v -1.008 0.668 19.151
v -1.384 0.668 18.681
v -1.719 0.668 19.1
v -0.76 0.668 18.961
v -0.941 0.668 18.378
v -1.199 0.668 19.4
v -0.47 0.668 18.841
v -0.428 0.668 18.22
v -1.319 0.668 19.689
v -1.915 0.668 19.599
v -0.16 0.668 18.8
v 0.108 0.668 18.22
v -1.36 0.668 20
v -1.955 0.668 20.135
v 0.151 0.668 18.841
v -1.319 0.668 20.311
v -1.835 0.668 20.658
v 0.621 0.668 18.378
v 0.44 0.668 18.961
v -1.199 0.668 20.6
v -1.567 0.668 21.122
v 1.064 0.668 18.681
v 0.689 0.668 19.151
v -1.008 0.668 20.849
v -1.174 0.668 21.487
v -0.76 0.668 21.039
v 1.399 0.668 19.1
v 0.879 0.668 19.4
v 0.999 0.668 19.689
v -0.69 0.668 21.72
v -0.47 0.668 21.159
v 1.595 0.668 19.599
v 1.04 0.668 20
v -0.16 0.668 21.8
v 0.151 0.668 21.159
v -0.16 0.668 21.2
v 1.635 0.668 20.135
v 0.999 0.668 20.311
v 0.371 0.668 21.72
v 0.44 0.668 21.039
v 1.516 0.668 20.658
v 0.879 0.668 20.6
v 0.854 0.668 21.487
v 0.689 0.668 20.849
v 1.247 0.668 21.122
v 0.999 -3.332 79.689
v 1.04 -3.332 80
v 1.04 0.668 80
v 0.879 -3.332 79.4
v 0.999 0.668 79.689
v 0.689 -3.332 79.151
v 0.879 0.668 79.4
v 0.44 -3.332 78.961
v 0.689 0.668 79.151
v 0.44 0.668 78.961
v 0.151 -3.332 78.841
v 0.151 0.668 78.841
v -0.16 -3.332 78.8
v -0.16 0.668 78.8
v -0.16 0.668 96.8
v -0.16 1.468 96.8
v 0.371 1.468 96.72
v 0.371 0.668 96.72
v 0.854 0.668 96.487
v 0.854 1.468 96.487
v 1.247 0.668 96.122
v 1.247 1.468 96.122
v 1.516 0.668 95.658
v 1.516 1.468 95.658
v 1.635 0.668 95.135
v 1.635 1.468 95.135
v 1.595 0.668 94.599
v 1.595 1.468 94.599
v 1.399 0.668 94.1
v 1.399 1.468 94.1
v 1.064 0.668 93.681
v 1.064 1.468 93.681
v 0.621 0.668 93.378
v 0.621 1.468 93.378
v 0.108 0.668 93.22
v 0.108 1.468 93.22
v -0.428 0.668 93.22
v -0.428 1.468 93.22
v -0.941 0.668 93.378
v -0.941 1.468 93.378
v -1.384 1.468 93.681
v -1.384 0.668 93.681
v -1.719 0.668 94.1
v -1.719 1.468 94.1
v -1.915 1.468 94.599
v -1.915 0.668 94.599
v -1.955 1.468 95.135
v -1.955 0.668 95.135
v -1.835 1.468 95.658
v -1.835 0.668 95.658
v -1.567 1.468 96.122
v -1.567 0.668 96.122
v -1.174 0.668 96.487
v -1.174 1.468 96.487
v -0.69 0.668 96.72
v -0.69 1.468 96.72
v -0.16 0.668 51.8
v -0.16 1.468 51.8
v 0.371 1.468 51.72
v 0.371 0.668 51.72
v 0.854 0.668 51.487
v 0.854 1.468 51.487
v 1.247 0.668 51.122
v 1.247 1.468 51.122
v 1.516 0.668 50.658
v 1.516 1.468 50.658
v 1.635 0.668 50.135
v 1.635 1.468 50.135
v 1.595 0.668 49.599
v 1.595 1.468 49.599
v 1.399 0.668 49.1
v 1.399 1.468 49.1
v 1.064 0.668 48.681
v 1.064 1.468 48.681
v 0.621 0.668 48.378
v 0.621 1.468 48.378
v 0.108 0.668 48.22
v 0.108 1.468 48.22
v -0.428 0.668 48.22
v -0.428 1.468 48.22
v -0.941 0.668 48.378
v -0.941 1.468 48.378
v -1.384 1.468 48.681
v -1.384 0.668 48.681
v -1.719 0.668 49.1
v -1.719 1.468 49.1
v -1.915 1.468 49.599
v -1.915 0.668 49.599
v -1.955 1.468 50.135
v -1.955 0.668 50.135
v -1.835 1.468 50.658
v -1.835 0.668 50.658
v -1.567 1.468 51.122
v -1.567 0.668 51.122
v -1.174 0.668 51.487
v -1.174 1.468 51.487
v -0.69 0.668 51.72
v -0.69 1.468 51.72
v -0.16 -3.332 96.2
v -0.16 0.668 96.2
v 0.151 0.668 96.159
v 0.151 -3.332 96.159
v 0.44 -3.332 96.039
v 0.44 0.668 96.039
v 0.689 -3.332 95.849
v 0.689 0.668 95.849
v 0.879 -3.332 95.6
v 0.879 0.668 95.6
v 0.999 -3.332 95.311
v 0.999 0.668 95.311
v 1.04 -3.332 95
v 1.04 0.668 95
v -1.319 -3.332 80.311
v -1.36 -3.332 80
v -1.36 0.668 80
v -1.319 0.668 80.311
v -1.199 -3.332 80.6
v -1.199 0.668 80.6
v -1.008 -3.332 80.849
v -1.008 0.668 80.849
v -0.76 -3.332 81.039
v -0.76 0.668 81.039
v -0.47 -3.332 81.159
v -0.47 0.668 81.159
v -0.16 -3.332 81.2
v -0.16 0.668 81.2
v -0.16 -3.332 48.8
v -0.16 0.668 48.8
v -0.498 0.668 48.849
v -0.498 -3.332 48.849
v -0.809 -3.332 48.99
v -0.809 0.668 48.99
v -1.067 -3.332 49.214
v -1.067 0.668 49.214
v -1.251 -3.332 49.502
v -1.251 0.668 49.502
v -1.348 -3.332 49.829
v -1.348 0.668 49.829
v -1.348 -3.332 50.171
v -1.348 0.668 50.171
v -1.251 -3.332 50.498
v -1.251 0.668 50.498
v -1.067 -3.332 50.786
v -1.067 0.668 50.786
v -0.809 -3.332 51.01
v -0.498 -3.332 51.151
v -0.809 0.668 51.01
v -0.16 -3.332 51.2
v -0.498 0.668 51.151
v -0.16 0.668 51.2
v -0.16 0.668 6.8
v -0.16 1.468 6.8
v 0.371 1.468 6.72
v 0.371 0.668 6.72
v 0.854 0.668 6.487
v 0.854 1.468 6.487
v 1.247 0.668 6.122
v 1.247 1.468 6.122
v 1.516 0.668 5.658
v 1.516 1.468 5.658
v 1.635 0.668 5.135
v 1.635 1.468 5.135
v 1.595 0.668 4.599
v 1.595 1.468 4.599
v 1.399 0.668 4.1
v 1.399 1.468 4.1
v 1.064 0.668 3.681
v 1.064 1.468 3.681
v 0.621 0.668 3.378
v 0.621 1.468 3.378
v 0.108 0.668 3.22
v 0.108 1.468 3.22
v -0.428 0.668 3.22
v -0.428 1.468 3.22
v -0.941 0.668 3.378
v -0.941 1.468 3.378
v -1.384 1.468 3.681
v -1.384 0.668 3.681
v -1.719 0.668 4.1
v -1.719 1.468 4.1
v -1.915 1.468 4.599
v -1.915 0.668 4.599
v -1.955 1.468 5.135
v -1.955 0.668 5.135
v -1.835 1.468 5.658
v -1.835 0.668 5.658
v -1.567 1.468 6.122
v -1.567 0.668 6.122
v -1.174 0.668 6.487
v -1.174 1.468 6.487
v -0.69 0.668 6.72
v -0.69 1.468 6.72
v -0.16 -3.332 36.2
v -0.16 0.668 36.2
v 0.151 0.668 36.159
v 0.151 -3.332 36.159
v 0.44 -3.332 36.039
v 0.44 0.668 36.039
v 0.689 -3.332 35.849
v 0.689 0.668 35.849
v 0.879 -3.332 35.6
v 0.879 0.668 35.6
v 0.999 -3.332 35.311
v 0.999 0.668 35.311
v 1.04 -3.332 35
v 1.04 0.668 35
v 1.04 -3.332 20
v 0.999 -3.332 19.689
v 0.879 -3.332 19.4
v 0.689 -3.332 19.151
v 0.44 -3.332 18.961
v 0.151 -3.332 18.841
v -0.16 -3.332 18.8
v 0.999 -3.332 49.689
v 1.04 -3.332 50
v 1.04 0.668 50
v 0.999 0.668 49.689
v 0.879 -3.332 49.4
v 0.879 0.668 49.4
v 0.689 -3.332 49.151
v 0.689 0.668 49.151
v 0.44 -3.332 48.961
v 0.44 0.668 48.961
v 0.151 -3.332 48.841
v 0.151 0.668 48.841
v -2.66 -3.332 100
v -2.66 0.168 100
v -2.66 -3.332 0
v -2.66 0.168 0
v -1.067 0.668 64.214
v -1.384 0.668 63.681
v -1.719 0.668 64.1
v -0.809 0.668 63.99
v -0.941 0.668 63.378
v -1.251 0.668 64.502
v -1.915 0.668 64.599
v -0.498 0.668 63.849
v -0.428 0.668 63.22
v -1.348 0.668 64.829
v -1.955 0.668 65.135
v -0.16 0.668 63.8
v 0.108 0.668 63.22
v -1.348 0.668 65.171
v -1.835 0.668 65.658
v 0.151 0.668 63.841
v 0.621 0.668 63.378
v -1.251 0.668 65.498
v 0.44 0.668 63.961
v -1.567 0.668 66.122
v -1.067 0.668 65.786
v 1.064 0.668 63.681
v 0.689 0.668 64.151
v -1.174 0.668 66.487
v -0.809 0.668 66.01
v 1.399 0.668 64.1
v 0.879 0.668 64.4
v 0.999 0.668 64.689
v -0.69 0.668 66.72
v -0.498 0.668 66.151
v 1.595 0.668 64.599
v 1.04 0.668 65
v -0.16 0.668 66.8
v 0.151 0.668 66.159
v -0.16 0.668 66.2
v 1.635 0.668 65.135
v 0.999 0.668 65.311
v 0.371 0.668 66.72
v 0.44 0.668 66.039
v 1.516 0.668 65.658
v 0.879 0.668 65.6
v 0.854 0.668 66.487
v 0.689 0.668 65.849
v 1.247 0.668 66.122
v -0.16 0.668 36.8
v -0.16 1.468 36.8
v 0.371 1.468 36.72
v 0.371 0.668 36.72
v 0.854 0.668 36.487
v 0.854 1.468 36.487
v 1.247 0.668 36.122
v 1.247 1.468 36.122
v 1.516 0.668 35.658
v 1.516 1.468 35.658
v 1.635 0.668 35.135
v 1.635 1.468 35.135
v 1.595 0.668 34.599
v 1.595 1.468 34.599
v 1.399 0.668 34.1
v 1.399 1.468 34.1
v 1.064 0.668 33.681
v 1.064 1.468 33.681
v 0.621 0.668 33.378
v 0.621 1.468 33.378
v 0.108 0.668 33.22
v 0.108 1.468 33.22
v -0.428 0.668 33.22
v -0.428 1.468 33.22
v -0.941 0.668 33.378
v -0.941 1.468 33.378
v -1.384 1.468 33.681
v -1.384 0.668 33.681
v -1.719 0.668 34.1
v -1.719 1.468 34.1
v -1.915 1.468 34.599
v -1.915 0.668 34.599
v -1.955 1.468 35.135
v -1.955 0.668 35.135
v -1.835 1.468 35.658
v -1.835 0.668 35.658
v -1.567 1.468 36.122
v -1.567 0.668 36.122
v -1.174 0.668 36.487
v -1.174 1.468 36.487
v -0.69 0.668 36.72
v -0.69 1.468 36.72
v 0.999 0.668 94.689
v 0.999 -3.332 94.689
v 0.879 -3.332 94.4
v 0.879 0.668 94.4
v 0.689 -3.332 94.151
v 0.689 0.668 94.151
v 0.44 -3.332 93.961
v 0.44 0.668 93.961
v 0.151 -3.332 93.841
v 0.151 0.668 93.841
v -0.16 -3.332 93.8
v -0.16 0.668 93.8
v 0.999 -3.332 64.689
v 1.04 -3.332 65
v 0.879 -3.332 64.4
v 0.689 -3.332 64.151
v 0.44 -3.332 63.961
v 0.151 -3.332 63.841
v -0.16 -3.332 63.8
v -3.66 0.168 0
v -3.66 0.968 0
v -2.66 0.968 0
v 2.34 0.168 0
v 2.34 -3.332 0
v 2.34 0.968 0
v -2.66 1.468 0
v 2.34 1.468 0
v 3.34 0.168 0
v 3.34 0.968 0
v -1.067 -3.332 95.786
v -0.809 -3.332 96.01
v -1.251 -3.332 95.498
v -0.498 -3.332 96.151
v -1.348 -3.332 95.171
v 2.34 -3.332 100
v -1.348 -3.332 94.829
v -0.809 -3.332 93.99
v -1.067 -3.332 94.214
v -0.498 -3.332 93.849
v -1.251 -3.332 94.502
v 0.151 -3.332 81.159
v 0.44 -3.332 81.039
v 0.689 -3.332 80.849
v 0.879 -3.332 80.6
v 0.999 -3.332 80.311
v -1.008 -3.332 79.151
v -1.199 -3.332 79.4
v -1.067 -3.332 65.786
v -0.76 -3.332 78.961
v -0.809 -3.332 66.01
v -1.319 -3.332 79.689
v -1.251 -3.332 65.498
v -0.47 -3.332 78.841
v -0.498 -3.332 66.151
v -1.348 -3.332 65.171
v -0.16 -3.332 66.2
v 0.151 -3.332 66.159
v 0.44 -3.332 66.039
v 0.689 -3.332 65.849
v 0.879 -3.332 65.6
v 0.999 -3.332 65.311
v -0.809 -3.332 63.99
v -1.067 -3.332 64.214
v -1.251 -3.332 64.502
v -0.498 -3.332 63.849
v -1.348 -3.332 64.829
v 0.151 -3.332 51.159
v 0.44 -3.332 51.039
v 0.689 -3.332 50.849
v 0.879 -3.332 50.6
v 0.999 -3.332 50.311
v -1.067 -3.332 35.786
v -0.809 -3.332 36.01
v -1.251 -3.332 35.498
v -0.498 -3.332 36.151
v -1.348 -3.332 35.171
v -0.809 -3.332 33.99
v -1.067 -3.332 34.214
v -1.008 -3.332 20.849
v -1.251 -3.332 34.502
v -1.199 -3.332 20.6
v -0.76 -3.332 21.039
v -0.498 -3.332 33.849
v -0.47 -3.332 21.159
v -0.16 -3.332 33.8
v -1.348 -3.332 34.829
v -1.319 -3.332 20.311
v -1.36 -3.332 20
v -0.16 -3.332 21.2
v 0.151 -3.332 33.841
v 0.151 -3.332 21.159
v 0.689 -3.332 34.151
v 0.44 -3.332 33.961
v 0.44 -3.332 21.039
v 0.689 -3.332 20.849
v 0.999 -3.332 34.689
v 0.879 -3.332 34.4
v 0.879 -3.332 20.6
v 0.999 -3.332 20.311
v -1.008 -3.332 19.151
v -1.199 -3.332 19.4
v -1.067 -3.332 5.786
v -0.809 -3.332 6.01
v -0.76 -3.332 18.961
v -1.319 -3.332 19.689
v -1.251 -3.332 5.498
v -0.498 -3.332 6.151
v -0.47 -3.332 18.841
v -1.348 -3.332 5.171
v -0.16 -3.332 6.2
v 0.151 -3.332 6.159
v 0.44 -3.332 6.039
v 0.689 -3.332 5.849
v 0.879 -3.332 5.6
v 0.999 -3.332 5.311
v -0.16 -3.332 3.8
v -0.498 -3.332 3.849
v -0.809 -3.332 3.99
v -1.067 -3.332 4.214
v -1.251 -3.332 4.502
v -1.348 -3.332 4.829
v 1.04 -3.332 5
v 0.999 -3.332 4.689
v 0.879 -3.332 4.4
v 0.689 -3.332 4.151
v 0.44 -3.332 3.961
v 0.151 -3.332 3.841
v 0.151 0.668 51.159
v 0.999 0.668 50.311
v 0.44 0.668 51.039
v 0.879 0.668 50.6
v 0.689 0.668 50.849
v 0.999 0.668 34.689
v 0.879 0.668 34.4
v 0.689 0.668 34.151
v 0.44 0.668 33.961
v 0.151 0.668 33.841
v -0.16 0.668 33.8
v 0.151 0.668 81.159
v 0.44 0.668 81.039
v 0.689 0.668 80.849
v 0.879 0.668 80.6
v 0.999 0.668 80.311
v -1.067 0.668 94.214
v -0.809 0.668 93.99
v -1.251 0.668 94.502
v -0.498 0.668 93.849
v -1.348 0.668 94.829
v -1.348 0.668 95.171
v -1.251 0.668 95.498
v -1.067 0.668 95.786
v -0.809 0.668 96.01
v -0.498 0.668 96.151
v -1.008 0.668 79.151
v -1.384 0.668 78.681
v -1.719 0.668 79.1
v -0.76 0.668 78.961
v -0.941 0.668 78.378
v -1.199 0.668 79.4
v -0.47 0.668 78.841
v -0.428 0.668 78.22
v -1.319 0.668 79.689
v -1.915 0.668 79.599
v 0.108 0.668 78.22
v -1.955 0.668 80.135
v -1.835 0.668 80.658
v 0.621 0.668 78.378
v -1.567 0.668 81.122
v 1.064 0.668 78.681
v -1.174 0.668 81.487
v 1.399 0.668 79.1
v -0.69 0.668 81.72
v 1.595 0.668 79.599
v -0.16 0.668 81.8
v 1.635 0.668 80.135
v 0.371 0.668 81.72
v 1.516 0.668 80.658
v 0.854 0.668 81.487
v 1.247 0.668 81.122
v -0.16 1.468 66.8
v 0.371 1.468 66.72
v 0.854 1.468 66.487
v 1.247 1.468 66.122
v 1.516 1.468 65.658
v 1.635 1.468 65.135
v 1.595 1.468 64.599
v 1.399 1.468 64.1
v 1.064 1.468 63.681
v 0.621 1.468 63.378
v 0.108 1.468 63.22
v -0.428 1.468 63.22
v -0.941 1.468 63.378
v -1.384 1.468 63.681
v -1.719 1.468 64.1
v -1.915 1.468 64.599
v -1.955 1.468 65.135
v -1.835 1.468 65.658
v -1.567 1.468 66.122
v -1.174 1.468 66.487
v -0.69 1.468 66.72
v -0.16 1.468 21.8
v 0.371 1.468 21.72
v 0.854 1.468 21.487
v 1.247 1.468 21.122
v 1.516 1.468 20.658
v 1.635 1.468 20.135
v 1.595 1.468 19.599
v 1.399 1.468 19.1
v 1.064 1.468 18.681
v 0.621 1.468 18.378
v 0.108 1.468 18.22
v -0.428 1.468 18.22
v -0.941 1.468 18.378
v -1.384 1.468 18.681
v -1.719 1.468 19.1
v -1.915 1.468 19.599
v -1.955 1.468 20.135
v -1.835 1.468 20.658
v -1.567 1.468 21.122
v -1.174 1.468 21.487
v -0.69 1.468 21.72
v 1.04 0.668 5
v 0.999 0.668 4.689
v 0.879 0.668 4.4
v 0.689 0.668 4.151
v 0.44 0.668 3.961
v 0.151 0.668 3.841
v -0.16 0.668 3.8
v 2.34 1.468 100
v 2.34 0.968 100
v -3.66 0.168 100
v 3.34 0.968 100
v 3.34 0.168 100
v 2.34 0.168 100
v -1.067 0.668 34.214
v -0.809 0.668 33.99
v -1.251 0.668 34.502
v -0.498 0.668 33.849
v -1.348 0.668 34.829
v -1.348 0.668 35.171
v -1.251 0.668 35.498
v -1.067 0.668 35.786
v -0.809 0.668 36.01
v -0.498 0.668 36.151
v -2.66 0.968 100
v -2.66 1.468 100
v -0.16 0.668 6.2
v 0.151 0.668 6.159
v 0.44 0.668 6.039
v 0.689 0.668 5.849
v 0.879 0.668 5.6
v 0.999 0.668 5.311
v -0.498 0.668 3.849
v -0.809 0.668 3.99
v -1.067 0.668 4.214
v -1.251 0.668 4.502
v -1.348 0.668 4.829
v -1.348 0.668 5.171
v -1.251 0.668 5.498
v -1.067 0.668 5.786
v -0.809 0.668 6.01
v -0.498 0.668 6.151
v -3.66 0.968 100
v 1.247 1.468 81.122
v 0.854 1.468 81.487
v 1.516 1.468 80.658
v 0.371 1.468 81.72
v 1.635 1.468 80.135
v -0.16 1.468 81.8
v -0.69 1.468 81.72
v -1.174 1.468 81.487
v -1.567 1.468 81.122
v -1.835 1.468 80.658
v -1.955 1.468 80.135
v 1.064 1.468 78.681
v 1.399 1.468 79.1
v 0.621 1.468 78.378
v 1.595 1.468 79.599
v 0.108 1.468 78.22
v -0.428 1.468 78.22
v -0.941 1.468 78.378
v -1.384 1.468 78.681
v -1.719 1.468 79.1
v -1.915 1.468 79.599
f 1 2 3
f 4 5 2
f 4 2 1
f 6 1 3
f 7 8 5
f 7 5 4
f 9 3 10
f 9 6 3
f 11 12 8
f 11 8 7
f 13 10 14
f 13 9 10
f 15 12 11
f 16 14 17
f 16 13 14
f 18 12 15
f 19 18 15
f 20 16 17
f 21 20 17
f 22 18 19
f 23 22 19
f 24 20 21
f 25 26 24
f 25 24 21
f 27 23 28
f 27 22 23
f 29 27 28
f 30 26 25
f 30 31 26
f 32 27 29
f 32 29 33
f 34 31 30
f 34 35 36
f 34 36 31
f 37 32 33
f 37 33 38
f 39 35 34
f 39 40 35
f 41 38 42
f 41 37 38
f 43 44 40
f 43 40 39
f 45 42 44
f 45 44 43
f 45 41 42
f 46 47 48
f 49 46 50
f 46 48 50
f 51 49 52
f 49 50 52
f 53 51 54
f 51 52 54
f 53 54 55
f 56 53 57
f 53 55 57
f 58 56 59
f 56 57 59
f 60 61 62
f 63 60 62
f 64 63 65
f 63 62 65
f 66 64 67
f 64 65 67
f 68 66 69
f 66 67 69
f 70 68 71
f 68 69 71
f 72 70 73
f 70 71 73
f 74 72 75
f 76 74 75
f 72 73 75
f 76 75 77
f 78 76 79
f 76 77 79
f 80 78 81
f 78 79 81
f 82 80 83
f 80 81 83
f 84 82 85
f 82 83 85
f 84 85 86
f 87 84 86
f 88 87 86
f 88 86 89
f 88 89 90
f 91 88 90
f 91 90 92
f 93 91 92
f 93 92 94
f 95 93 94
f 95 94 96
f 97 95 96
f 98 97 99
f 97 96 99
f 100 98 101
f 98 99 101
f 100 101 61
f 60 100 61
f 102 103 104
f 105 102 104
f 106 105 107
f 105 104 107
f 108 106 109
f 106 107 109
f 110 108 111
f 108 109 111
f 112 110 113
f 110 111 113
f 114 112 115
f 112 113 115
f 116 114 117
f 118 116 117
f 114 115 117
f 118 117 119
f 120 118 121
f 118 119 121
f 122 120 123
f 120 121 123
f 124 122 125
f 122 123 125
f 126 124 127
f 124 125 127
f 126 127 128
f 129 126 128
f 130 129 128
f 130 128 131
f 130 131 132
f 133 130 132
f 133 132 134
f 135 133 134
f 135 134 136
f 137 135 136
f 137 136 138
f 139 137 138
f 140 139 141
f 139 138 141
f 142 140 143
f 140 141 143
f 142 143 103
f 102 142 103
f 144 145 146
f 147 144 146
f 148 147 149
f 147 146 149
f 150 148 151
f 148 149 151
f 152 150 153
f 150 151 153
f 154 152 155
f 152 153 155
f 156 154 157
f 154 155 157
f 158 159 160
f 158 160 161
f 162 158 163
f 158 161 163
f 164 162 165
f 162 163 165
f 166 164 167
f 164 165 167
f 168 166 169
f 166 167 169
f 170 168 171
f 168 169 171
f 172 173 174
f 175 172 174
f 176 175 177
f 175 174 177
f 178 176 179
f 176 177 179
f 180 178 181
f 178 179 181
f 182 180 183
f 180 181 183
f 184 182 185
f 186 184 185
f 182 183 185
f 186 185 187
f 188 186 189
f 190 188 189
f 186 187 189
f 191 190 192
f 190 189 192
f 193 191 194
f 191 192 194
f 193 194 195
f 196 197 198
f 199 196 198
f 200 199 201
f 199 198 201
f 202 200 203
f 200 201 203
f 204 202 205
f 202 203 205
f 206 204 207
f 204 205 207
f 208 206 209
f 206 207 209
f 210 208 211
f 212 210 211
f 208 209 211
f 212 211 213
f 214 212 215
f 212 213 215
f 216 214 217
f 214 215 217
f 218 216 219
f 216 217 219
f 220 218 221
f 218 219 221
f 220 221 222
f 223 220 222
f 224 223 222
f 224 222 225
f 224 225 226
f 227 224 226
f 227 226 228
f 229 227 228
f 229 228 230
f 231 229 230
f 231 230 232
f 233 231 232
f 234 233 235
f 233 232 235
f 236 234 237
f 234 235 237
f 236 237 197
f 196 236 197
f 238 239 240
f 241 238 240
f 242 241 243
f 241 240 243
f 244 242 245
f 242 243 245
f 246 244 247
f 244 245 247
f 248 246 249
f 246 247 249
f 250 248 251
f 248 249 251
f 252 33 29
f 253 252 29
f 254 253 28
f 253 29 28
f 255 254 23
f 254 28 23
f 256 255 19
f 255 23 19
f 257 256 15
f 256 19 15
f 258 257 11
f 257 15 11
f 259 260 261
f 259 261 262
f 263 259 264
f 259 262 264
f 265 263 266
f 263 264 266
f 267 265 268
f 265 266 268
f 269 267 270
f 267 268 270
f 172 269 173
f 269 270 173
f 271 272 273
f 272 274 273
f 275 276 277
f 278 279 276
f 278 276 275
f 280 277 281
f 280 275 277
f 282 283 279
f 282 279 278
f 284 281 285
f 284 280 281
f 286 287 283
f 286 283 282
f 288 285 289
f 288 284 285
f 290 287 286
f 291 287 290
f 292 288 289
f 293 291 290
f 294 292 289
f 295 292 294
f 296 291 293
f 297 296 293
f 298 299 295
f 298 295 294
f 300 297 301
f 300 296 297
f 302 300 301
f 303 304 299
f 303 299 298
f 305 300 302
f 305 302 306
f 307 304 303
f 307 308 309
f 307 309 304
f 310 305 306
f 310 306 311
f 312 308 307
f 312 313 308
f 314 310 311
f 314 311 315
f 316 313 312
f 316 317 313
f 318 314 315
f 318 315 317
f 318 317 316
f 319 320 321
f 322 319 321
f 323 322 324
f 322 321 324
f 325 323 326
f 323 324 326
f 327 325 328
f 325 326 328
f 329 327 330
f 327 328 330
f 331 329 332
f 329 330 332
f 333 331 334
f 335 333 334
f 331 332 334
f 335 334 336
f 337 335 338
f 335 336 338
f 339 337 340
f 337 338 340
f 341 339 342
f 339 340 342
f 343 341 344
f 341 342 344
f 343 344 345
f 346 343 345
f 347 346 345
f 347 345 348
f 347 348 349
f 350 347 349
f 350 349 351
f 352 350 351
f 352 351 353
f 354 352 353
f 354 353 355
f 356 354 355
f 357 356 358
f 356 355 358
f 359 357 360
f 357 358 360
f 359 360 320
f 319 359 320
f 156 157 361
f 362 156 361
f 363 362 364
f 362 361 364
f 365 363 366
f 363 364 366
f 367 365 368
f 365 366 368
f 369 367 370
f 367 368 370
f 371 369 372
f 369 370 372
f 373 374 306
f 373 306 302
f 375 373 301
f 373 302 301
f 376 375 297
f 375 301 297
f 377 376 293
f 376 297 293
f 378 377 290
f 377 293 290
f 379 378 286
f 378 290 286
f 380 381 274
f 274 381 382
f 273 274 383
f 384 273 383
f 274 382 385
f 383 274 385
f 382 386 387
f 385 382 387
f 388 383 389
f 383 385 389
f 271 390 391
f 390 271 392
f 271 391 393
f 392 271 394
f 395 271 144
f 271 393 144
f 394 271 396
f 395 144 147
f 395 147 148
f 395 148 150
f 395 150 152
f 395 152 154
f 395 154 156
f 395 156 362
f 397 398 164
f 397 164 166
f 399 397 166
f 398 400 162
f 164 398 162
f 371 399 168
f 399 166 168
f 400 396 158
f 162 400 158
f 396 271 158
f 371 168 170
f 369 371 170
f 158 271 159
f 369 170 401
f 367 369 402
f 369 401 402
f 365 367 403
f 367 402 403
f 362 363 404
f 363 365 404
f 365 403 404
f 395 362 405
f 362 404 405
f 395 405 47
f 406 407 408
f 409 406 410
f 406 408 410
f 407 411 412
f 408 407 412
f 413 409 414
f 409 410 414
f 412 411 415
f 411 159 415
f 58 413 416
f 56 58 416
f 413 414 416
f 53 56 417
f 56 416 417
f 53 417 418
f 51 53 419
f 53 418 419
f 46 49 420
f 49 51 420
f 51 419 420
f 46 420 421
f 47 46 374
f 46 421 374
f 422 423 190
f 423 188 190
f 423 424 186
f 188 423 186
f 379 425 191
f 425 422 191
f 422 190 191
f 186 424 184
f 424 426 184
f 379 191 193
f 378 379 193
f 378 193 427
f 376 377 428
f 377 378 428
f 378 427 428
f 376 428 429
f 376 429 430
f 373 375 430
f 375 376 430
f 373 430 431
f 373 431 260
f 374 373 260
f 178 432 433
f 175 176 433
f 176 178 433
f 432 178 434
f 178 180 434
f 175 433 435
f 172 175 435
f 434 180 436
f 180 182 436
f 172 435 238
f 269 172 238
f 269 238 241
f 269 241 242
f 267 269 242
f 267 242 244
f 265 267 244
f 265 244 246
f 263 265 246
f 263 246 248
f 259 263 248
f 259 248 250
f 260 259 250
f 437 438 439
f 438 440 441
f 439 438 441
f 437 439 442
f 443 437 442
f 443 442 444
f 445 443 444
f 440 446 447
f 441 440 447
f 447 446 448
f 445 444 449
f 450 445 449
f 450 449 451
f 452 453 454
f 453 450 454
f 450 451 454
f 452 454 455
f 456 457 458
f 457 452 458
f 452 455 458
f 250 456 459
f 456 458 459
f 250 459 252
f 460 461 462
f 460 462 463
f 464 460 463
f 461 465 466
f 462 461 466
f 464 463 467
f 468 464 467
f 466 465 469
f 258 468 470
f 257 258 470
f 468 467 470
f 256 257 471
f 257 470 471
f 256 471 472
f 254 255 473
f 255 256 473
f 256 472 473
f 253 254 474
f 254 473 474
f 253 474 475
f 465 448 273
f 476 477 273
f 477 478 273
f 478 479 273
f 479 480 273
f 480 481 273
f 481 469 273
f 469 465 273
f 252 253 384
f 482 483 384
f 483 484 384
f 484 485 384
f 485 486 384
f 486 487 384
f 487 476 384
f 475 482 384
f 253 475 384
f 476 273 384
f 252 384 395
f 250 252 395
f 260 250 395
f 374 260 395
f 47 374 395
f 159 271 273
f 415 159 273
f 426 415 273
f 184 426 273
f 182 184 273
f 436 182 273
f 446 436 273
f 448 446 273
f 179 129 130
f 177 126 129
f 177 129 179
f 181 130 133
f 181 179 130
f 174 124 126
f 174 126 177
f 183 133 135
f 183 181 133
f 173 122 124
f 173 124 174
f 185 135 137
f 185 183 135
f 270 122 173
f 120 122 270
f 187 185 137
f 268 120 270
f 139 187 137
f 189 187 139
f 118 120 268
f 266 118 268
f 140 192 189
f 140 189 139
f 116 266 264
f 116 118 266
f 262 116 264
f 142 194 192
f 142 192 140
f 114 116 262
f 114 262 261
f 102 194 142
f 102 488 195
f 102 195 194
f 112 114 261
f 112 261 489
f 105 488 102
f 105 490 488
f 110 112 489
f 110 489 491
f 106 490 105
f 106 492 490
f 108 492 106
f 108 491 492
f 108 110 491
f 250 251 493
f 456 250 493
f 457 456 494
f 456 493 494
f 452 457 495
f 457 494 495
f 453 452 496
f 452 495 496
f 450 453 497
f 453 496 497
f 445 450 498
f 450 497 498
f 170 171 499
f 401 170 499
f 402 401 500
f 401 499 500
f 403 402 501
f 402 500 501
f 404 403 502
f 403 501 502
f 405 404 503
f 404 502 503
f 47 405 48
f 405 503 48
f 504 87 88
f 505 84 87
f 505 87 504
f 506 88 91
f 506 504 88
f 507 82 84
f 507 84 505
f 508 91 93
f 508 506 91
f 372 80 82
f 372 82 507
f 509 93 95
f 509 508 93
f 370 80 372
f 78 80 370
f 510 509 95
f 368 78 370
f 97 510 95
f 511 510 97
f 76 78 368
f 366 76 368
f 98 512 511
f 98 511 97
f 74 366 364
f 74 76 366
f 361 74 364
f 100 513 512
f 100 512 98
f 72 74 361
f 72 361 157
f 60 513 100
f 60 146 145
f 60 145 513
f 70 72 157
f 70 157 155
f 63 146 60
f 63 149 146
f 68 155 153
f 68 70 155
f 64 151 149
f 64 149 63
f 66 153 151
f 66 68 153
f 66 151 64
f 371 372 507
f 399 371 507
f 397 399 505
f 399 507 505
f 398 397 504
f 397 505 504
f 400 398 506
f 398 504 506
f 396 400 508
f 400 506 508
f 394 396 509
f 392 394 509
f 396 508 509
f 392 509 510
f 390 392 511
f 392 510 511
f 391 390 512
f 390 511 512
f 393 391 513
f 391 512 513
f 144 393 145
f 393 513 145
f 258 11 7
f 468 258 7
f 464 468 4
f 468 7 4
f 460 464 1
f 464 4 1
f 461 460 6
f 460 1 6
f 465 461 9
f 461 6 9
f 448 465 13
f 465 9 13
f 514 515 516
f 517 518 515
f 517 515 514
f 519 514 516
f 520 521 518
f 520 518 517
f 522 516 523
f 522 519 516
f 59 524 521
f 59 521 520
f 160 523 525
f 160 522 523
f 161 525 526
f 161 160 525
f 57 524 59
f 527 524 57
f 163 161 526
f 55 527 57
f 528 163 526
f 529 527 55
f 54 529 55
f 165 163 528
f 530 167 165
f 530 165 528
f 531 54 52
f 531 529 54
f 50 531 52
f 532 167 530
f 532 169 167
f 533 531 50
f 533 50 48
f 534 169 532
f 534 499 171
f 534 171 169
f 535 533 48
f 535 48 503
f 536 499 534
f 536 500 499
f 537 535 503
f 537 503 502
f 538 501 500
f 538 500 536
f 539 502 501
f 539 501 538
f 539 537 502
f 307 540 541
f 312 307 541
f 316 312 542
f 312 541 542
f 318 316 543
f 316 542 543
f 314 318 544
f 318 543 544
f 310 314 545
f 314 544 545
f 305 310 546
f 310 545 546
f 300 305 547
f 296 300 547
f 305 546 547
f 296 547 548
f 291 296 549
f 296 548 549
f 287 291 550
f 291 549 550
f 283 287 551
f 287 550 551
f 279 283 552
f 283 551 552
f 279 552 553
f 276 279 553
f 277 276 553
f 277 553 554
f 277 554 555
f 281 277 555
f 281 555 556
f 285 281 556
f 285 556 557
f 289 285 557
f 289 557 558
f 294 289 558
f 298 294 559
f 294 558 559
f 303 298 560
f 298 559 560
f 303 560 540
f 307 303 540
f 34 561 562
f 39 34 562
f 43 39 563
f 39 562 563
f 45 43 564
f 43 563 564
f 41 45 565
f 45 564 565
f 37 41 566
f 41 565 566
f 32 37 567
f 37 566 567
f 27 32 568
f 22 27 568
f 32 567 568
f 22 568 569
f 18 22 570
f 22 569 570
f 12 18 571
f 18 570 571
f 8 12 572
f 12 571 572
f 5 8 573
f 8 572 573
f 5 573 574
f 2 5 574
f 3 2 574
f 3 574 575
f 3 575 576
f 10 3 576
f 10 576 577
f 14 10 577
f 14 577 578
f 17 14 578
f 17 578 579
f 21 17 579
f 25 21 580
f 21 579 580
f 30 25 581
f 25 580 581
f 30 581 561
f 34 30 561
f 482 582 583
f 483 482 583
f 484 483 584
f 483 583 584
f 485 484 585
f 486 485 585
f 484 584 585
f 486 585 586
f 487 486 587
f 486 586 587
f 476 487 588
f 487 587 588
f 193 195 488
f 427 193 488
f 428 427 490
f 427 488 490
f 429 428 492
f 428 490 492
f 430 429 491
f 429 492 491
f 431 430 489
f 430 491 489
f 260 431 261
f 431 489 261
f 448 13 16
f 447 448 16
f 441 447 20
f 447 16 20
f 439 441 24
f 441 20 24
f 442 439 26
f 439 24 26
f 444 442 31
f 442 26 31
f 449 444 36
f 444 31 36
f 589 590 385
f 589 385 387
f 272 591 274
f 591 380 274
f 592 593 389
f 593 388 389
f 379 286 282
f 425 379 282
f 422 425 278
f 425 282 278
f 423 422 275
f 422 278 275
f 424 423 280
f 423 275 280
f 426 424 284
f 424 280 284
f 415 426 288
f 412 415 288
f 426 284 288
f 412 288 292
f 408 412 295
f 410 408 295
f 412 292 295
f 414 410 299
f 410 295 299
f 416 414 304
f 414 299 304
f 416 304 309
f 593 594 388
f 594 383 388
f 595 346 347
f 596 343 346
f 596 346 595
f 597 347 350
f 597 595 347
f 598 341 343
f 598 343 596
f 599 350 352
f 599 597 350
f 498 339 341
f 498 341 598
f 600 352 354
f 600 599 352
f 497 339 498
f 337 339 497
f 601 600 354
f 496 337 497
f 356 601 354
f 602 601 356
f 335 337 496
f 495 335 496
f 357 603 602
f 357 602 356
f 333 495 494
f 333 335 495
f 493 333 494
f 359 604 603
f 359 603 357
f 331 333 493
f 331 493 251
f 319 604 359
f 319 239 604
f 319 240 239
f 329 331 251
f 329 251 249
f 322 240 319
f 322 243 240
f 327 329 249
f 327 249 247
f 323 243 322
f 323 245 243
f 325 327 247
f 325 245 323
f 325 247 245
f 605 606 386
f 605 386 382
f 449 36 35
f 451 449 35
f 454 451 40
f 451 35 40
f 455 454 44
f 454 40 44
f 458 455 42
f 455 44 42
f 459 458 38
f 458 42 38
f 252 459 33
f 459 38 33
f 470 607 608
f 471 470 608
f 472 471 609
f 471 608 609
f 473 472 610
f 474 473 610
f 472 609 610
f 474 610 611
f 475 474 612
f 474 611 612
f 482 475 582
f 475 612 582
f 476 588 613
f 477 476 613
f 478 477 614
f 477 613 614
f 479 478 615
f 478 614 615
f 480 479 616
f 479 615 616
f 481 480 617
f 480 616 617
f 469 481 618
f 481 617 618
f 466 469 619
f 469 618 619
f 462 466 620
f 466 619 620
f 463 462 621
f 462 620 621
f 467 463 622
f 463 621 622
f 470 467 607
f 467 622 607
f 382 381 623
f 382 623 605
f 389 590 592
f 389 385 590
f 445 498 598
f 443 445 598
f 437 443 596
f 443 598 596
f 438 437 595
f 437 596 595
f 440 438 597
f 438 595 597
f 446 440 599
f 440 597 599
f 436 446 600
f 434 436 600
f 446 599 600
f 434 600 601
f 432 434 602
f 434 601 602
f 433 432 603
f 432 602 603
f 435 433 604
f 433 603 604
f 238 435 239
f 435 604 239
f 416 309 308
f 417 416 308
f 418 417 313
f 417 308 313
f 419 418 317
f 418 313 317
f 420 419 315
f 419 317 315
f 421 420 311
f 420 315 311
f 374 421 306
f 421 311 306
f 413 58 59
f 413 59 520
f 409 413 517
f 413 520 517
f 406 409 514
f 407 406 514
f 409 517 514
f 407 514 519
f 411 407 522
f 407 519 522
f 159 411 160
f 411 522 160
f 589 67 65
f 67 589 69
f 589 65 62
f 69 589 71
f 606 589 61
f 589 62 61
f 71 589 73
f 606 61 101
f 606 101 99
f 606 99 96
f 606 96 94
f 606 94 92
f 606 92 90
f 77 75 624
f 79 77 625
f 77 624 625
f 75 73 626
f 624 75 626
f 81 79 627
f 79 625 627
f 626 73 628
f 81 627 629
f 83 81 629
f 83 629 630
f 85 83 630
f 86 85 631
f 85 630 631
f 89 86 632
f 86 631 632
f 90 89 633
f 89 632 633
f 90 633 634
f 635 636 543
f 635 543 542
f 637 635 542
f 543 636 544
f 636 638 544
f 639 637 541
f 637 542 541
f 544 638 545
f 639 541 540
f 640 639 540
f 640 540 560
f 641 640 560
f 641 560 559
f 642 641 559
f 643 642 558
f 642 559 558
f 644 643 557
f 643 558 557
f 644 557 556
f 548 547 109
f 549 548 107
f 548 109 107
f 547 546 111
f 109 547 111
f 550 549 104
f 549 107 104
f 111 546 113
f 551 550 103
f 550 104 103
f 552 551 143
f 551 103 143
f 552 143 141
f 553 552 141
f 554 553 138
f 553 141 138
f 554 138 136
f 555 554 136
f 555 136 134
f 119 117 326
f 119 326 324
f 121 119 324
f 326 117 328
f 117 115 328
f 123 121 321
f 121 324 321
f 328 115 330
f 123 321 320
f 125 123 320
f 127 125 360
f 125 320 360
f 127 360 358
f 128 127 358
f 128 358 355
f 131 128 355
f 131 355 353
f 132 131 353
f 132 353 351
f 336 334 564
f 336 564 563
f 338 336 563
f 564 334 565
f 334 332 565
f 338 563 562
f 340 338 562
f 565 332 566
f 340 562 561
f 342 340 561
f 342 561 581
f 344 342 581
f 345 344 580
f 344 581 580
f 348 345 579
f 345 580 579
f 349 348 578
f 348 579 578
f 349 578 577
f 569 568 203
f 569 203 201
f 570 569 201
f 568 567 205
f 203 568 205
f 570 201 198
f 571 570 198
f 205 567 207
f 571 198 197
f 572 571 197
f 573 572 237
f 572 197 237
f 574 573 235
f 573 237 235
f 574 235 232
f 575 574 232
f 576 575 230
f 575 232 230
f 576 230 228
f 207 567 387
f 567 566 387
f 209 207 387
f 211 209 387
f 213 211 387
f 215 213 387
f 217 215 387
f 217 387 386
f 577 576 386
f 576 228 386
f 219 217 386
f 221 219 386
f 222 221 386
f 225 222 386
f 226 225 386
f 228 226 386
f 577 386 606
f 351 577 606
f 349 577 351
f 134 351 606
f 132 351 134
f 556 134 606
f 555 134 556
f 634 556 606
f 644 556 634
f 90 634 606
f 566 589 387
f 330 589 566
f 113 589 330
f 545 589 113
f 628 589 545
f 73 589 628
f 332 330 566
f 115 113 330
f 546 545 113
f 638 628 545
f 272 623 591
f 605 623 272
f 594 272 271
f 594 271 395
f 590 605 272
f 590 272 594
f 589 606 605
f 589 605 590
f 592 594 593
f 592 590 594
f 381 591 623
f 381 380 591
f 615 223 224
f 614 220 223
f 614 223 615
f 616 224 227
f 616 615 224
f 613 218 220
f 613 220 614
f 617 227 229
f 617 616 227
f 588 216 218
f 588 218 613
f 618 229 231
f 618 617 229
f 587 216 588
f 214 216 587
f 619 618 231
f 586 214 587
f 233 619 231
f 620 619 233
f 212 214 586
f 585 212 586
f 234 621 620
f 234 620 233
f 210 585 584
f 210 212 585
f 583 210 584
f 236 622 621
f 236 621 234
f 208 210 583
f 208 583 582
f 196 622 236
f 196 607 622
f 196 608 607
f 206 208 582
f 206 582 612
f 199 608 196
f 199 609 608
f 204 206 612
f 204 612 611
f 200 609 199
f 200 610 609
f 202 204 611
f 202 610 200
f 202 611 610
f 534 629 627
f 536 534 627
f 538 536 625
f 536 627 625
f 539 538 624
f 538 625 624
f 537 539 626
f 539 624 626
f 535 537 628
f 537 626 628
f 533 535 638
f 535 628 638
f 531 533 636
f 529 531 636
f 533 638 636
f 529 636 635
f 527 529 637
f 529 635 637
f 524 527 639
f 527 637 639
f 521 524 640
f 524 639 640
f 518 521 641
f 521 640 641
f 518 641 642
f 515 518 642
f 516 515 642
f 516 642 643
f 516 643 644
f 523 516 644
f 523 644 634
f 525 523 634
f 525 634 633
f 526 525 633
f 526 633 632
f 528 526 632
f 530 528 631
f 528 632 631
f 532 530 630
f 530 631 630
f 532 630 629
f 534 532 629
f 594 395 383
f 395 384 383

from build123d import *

# Parameters (mm, degrees)
SKETCH_1_W             = 1
SKETCH_1_H             = 0.8
EXTRUDE_1_DEPTH        = 40
CUT_EXTRUDE_1_DEPTH    = 55
SKETCH_3_R             = 1.8
CUT_EXTRUDE_2_DEPTH    = 0.8
MOVE_FACE_2_BY         = 60
PATTERN_LINEAR_1_COUNT = 5
PATTERN_LINEAR_1_PITCH = 15


with BuildPart() as part:
    # 草图1 → 凸台-拉伸1 (new body)
    with BuildSketch(Plane.XY):
        with Locations((-3.159883721, 0.568023256)):
            Rectangle(SKETCH_1_W, SKETCH_1_H)
        Polygon((-0.159883721, -3.331976744), (-0.159883721, 1.468023256), (-2.659883721, 1.468023256), (-2.659883721, 0.968023256), (-2.659883721, 0.168023256), (-2.659883721, -3.331976744), align=None)
        Polygon((2.340116279, 0.968023256), (2.340116279, 1.468023256), (-0.159883721, 1.468023256), (-0.159883721, -3.331976744), (2.340116279, -3.331976744), (2.340116279, 0.168023256), align=None)
        with Locations((2.840116279, 0.568023256)):
            Rectangle(SKETCH_1_W, SKETCH_1_H)
    extrude(amount=EXTRUDE_1_DEPTH)

    # 草图2 → 切除-拉伸1 (cut)
    with BuildSketch(Plane(origin=(0, 1.468023256, 0), x_dir=(1, 0, 0), z_dir=(0, 1, 0))):
        with BuildLine():
            ThreePointArc((-0.159883721, -3.8), (-1.359883721, -5), (-0.159883721, -6.2))
            Line((-0.159883721, -6.2), (-0.159883721, -3.8))
        make_face()
        with BuildLine():
            Line((-0.159883721, -3.8), (-0.159883721, -6.2))
            ThreePointArc((-0.159883721, -6.2), (0.688644416, -5.848528137), (1.040116279, -5))
            ThreePointArc((1.040116279, -5), (0.688644416, -4.151471863), (-0.159883721, -3.8))
        make_face()
        with BuildLine():
            ThreePointArc((-1.359883721, -20), (-1.008411858, -20.848528137), (-0.159883721, -21.2))
            Line((-0.159883721, -21.2), (-0.159883721, -20))
            Line((-0.159883721, -20), (-1.359883721, -20))
        make_face()
        with BuildLine():
            Line((-0.159883721, -20), (-0.159883721, -21.2))
            ThreePointArc((-0.159883721, -21.2), (0.688644416, -20.848528137), (1.040116279, -20))
            Line((1.040116279, -20), (-0.159883721, -20))
        make_face()
        with BuildLine():
            Line((-1.359883721, -20), (-0.159883721, -20))
            Line((-0.159883721, -20), (-0.159883721, -18.8))
            ThreePointArc((-0.159883721, -18.8), (-1.008411858, -19.151471863), (-1.359883721, -20))
        make_face()
        with BuildLine():
            Line((-0.159883721, -18.8), (-0.159883721, -20))
            Line((-0.159883721, -20), (1.040116279, -20))
            ThreePointArc((1.040116279, -20), (0.688644416, -19.151471863), (-0.159883721, -18.8))
        make_face()
        with BuildLine():
            ThreePointArc((-0.159883721, -33.8), (-1.359883721, -35), (-0.159883721, -36.2))
            Line((-0.159883721, -36.2), (-0.159883721, -35))
            Line((-0.159883721, -35), (-0.159883721, -33.8))
        make_face()
        with BuildLine():
            Line((-0.159883721, -35), (-0.159883721, -36.2))
            ThreePointArc((-0.159883721, -36.2), (0.688644416, -35.848528137), (1.040116279, -35))
            ThreePointArc((1.040116279, -35), (0.688644416, -34.151471863), (-0.159883721, -33.8))
            Line((-0.159883721, -33.8), (-0.159883721, -35))
        make_face()
    cut_extrude_1 = extrude(amount=-CUT_EXTRUDE_1_DEPTH, mode=Mode.SUBTRACT)

    # 草图3 → 切除-拉伸2 (cut)
    with BuildSketch(Plane(origin=(0, 1.468023256, 0), x_dir=(1, 0, 0), z_dir=(0, 1, 0))):
        with Locations(Location((-0.159883721, -35, 0), (0, 0, 270))):
            Circle(SKETCH_3_R)
        with Locations(Location((-0.159883721, -20, 0), (0, 0, 270))):
            Circle(SKETCH_3_R)
        with Locations(Location((-0.159883721, -5, 0), (0, 0, 270))):
            Circle(SKETCH_3_R)
    cut_extrude_2 = extrude(amount=-CUT_EXTRUDE_2_DEPTH, mode=Mode.SUBTRACT)

    # Move Face 2: a face moved outward by 60.0
    extrude(part.faces().sort_by_distance((-0.159883721, -0.838226744, 40))[0], amount=MOVE_FACE_2_BY, dir=(0, 0, 1))

    # 阵列(线性)1: 切除-拉伸1, 切除-拉伸2 ×5
    with Locations(*[(0, 0, i * PATTERN_LINEAR_1_PITCH) for i in range(1, PATTERN_LINEAR_1_COUNT)]):
        add(cut_extrude_1, mode=Mode.SUBTRACT)
        add(cut_extrude_2, mode=Mode.SUBTRACT)


solid = part.part
